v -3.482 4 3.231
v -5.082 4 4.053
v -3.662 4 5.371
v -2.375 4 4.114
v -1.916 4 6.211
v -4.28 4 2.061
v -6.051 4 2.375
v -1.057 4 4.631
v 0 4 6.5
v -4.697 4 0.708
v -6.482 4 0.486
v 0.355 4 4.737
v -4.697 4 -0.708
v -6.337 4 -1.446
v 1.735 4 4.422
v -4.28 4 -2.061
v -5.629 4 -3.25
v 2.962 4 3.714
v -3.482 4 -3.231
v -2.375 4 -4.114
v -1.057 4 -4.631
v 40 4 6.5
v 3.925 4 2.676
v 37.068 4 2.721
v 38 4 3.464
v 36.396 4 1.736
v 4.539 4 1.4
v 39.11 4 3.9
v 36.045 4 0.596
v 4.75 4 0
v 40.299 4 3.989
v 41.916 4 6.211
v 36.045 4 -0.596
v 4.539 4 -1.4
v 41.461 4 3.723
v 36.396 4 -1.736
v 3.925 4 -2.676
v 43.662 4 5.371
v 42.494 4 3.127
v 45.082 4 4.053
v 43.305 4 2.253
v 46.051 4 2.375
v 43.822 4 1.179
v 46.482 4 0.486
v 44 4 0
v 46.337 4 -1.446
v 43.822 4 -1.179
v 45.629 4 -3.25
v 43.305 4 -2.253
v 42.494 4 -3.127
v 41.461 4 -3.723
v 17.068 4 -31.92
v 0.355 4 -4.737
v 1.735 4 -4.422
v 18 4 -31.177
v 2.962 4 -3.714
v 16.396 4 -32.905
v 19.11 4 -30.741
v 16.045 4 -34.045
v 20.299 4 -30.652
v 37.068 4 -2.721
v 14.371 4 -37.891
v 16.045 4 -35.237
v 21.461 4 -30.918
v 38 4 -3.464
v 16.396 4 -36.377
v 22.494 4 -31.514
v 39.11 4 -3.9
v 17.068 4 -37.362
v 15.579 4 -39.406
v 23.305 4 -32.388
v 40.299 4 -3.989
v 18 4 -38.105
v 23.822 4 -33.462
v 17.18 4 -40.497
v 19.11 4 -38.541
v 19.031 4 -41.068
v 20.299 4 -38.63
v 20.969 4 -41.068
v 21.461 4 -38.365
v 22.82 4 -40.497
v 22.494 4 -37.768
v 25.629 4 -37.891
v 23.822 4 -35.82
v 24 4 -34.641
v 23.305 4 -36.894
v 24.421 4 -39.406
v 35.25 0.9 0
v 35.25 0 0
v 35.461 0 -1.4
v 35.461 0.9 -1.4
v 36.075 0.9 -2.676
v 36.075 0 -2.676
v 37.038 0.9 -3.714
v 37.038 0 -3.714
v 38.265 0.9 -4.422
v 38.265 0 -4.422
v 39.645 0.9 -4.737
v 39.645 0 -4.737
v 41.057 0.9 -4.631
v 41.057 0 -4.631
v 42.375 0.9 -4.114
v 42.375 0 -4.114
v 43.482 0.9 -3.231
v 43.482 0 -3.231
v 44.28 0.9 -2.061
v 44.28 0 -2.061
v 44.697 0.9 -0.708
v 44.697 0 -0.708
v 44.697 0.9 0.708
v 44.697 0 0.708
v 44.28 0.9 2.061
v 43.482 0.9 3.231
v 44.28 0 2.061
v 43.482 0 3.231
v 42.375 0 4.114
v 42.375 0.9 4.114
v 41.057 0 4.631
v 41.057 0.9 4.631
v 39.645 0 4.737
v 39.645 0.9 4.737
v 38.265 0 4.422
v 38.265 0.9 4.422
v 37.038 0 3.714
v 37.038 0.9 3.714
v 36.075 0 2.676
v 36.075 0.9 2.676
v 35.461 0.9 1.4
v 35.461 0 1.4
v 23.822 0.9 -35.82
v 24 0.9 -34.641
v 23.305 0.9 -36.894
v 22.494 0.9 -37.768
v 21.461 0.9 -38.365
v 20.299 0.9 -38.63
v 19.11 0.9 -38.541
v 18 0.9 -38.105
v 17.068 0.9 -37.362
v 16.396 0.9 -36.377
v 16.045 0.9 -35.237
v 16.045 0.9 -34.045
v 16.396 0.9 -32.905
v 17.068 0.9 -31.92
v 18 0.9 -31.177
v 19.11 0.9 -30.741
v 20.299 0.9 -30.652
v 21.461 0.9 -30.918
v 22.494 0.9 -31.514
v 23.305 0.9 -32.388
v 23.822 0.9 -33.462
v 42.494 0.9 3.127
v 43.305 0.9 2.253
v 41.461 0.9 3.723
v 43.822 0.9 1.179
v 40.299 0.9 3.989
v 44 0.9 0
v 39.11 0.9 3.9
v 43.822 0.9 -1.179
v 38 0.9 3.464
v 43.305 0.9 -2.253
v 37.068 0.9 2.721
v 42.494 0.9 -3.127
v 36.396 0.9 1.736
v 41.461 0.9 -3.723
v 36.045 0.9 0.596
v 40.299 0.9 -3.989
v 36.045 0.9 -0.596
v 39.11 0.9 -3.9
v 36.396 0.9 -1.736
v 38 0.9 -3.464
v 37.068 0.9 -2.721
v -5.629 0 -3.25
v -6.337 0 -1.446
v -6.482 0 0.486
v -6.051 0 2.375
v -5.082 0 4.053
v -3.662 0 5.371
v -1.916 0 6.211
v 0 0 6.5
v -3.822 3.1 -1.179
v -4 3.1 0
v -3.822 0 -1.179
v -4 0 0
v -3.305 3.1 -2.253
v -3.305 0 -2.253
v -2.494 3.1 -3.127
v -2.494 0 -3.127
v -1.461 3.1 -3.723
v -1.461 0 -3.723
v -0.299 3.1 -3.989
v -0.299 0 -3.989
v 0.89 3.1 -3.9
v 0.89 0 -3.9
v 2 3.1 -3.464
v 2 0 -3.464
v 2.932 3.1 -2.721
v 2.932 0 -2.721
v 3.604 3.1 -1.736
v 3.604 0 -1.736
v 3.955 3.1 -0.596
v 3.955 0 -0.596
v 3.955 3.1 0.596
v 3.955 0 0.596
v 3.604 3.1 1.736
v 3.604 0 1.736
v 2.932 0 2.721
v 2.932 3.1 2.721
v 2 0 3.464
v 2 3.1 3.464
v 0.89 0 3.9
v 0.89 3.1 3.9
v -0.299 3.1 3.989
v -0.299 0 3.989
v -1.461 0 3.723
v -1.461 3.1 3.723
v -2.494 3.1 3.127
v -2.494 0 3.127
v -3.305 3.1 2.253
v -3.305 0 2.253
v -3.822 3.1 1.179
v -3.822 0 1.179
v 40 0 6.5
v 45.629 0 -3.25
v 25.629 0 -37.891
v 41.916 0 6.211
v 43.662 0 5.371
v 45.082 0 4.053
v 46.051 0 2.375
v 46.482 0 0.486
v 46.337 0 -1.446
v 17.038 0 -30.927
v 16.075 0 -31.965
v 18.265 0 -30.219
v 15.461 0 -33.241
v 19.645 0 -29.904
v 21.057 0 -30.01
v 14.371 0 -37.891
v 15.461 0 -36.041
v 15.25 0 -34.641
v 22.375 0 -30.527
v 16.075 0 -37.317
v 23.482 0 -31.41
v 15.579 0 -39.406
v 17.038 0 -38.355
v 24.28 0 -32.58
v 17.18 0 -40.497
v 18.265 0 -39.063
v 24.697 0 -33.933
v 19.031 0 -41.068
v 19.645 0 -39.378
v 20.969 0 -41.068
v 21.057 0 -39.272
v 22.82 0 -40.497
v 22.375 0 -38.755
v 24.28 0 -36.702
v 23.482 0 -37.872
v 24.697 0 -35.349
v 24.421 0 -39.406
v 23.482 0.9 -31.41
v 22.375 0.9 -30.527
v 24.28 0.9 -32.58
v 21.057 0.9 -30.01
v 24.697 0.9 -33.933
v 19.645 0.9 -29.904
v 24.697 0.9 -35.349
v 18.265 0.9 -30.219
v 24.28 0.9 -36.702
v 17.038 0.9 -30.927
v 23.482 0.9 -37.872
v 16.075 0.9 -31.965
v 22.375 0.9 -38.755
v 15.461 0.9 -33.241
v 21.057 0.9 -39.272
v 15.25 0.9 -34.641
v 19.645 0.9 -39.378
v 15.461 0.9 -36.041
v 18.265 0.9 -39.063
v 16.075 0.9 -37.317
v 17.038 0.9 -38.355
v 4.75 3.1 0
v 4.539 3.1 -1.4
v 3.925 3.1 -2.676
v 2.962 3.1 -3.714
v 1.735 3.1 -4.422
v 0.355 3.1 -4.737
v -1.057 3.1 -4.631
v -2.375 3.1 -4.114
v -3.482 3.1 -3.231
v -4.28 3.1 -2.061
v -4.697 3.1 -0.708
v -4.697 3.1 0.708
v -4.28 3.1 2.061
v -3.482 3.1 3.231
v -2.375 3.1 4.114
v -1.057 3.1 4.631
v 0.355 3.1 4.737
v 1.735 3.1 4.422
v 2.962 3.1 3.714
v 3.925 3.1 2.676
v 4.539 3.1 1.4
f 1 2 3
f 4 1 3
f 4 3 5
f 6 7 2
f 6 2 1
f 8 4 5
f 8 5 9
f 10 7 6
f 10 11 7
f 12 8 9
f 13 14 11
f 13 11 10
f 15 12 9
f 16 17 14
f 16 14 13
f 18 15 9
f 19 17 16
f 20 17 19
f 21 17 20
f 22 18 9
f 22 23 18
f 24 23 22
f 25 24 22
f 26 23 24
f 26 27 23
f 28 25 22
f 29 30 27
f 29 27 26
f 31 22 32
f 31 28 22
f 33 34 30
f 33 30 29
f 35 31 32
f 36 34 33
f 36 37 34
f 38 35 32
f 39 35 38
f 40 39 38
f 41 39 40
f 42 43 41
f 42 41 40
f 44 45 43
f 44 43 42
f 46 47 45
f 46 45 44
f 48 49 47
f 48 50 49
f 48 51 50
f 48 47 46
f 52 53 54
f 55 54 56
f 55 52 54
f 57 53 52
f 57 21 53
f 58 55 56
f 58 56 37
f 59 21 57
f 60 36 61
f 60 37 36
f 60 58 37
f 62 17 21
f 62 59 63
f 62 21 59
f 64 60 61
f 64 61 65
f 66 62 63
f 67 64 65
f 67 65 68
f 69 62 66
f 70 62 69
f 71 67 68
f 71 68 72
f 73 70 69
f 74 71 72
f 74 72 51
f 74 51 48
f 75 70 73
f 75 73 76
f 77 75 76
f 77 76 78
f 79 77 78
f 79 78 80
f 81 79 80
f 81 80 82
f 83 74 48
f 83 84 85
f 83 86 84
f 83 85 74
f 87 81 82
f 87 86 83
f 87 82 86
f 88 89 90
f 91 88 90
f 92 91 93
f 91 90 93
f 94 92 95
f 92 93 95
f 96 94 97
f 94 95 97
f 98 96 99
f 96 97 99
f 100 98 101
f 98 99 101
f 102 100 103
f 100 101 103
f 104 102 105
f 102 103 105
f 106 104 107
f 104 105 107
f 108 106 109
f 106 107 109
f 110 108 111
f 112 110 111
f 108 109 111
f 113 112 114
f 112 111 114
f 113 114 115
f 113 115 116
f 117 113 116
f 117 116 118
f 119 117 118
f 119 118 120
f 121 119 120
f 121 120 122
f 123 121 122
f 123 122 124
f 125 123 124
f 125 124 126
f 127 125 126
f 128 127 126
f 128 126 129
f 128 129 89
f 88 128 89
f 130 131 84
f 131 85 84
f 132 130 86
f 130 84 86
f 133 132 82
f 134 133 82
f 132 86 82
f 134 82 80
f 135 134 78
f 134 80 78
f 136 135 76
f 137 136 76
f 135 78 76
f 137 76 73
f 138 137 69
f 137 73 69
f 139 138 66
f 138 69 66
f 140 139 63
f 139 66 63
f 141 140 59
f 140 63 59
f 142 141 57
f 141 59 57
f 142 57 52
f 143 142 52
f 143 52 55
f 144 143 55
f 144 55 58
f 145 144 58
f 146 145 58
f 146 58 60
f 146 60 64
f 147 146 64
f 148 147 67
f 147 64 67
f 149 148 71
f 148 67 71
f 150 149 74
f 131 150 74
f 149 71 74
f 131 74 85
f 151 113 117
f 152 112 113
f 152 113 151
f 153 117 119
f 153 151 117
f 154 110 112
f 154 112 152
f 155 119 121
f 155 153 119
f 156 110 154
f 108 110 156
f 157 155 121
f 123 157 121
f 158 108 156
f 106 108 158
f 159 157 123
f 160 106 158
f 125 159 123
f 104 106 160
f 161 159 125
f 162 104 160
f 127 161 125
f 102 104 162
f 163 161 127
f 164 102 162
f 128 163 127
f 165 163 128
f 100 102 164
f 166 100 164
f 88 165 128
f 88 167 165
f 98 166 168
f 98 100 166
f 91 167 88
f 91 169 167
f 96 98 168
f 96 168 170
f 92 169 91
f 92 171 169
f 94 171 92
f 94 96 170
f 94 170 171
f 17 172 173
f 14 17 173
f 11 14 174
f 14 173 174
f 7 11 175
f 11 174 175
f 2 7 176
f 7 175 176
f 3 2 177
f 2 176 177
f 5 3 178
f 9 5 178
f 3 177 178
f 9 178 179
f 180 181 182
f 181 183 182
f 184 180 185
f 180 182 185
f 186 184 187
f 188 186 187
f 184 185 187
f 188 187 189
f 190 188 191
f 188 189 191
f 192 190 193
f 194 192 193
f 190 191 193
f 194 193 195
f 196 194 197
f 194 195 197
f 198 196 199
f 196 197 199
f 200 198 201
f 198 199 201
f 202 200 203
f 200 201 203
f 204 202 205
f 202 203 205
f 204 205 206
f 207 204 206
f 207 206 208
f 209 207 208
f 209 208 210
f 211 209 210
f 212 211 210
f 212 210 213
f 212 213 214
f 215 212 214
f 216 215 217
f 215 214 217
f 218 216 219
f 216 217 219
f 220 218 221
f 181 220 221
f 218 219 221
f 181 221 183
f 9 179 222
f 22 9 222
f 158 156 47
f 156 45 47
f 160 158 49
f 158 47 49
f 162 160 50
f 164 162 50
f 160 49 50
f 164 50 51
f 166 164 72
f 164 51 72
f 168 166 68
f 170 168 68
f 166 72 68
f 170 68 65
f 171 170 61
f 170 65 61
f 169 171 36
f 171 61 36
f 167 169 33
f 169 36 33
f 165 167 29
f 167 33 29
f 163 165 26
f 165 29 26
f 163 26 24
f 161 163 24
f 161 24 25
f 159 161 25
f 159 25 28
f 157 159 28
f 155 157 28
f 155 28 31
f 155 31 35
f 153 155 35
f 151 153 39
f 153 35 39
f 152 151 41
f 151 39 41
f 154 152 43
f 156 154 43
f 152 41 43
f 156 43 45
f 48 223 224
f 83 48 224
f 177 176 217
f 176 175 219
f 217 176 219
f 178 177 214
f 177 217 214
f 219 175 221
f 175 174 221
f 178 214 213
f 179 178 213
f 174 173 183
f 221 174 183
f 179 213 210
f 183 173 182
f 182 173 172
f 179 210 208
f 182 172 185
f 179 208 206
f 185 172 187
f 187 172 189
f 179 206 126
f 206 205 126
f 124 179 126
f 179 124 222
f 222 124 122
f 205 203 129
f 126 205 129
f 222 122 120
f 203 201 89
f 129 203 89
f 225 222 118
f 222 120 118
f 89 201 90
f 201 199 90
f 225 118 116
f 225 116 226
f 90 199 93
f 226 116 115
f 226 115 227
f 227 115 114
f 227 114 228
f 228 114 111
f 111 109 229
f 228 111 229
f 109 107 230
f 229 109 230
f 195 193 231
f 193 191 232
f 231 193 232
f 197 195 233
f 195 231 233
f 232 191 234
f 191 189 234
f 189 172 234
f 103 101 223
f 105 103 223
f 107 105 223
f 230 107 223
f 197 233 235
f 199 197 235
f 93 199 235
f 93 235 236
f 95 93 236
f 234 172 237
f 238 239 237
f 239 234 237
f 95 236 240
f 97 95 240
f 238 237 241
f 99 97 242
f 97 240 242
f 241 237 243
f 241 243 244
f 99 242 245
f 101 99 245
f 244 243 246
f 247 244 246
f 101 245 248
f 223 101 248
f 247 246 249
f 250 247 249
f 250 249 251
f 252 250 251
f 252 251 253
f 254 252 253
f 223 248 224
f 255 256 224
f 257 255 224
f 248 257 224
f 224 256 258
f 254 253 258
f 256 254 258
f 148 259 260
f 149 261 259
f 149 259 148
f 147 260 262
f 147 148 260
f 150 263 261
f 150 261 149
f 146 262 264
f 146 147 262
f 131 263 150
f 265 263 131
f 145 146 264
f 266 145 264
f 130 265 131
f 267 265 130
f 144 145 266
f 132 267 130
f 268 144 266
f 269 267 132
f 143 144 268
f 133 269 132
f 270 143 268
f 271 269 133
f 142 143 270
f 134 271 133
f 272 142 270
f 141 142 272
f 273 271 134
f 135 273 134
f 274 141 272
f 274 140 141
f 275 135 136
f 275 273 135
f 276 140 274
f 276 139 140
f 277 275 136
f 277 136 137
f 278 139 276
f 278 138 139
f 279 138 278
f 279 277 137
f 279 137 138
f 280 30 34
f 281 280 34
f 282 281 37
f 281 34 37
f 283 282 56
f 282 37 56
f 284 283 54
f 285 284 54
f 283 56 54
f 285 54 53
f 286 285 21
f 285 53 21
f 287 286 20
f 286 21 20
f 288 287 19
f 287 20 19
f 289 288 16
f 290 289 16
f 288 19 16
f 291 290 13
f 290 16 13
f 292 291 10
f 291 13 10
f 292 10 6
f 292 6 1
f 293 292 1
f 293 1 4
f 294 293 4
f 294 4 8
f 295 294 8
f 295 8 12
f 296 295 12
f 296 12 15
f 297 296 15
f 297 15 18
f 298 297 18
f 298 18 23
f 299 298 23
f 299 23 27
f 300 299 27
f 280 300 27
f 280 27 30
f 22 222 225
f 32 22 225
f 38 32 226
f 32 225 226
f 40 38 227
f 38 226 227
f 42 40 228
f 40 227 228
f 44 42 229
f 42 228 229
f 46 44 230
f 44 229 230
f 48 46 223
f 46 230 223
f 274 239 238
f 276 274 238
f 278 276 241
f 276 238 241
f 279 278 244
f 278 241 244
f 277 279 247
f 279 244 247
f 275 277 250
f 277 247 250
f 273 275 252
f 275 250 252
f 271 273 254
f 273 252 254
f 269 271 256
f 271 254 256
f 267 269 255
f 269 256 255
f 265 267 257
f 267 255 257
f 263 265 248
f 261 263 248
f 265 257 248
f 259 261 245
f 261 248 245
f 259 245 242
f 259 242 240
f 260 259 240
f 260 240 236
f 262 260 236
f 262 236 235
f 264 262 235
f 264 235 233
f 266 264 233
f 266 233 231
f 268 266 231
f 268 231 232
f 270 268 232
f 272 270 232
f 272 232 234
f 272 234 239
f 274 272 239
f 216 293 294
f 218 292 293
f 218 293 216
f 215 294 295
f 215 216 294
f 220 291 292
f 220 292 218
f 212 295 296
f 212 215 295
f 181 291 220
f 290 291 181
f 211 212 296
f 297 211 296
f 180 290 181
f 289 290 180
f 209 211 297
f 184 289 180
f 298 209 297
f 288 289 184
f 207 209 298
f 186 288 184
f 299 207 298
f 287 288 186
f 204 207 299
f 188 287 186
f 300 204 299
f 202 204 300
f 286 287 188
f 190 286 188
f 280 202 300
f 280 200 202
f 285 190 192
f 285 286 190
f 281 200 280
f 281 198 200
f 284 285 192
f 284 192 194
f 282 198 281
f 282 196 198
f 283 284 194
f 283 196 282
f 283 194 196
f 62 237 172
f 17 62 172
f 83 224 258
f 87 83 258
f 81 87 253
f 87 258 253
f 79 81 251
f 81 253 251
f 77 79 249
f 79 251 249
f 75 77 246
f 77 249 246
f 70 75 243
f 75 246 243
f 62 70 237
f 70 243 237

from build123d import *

# Parameters (mm, degrees)
EXTRUDE_1_DEPTH              = 4
HOLE_WIZARD_M5_1_D           = 8
HOLE_WIZARD_M5_1_DEPTH       = 12.4
HOLE_WIZARD_M5_1_CBORE_D     = 9.5
HOLE_WIZARD_M5_1_CBORE_DEPTH = 0.9
HOLE_WIZARD_M5_1_TIP         = 2.403442476
HOLE_WIZARD_M5_2_D           = 8
HOLE_WIZARD_M5_2_DEPTH       = 12.4
HOLE_WIZARD_M5_2_CBORE_D     = 9.5
HOLE_WIZARD_M5_2_CBORE_DEPTH = 0.9
HOLE_WIZARD_M5_2_TIP         = 2.403442476


with BuildPart() as part:
    # 草图2 → 凸台-拉伸1 (new body)
    with BuildSketch(Plane(origin=(0, 0, 0), x_dir=(1, 0, 0), z_dir=(0, 1, 0))):
        with BuildLine():
            Line((20, 21.641016151), (28.741669751, 6.5))
            Line((28.741669751, 6.5), (40, 6.5))
            ThreePointArc((40, 6.5), (43.25, 5.629165125), (45.629165125, 3.25))
            Line((45.629165125, 3.25), (25.629165125, 37.891016151))
            ThreePointArc((25.629165125, 37.891016151), (26.5, 34.641016151), (25.629165125, 31.391016151))
            Line((25.629165125, 31.391016151), (20, 21.641016151))
        make_face()
        with BuildLine():
            Line((28.741669751, 6.5), (11.258330249, 6.5))
            Line((11.258330249, 6.5), (5.629165125, -3.25))
            ThreePointArc((5.629165125, -3.25), (3.25, -5.629165125), (0, -6.5))
            Line((0, -6.5), (40, -6.5))
            ThreePointArc((40, -6.5), (36.75, -5.629165125), (34.370834875, -3.25))
            Line((34.370834875, -3.25), (28.741669751, 6.5))
        make_face()
        with BuildLine():
            Line((40, 6.5), (28.741669751, 6.5))
            Line((28.741669751, 6.5), (34.370834875, -3.25))
            ThreePointArc((34.370834875, -3.25), (36.75, -5.629165125), (40, -6.5))
            ThreePointArc((40, -6.5), (45.629165125, -3.25), (45.629165125, 3.25))
            ThreePointArc((45.629165125, 3.25), (43.25, 5.629165125), (40, 6.5))
        make_face()
        with BuildLine():
            ThreePointArc((-5.629165125, 3.25), (-3.25, 5.629165125), (0, 6.5))
            Line((0, 6.5), (11.258330249, 6.5))
            Line((11.258330249, 6.5), (20, 21.641016151))
            Line((20, 21.641016151), (14.370834875, 31.391016151))
            ThreePointArc((14.370834875, 31.391016151), (13.5, 34.641016151), (14.370834875, 37.891016151))
            Line((14.370834875, 37.891016151), (-5.629165125, 3.25))
        make_face()
        with BuildLine():
            Line((14.370834875, 31.391016151), (20, 21.641016151))
            Line((20, 21.641016151), (25.629165125, 31.391016151))
            ThreePointArc((25.629165125, 31.391016151), (26.5, 34.641016151), (25.629165125, 37.891016151))
            ThreePointArc((25.629165125, 37.891016151), (20, 41.141016151), (14.370834875, 37.891016151))
            ThreePointArc((14.370834875, 37.891016151), (13.5, 34.641016151), (14.370834875, 31.391016151))
        make_face()
        with BuildLine():
            Line((11.258330249, 6.5), (0, 6.5))
            ThreePointArc((0, 6.5), (-3.25, 5.629165125), (-5.629165125, 3.25))
            ThreePointArc((-5.629165125, 3.25), (-5.629165125, -3.25), (0, -6.5))
            ThreePointArc((0, -6.5), (3.25, -5.629165125), (5.629165125, -3.25))
            Line((5.629165125, -3.25), (11.258330249, 6.5))
        make_face()
        Polygon((20, 21.641016151), (11.258330249, 6.5), (28.741669751, 6.5), align=None)
    extrude(amount=EXTRUDE_1_DEPTH)

    # M5 六角头螺栓的柱形沉头孔1
    with Locations(Plane(origin=(0, 4, 0), x_dir=(1, 0, 0), z_dir=(0, 1, 0))):
        with Locations((0, 0)):
            CounterBoreHole(HOLE_WIZARD_M5_1_D / 2, HOLE_WIZARD_M5_1_CBORE_D / 2, HOLE_WIZARD_M5_1_CBORE_DEPTH, depth=HOLE_WIZARD_M5_1_DEPTH)
            with Locations((0, 0, -(HOLE_WIZARD_M5_1_DEPTH + HOLE_WIZARD_M5_1_TIP / 2))):  # 118° drill point
                Cone(0, HOLE_WIZARD_M5_1_D / 2, HOLE_WIZARD_M5_1_TIP, mode=Mode.SUBTRACT)

    # M5 六角头螺栓的柱形沉头孔2
    with Locations(Plane(origin=(0, 0, 0), x_dir=(-1, 0, 0), z_dir=(0, -1, 0))):
        with Locations((-40, 0), (-20, 34.641016151)):
            CounterBoreHole(HOLE_WIZARD_M5_2_D / 2, HOLE_WIZARD_M5_2_CBORE_D / 2, HOLE_WIZARD_M5_2_CBORE_DEPTH, depth=HOLE_WIZARD_M5_2_DEPTH)
            with Locations((0, 0, -(HOLE_WIZARD_M5_2_DEPTH + HOLE_WIZARD_M5_2_TIP / 2))):  # 118° drill point
                Cone(0, HOLE_WIZARD_M5_2_D / 2, HOLE_WIZARD_M5_2_TIP, mode=Mode.SUBTRACT)


solid = part.part
